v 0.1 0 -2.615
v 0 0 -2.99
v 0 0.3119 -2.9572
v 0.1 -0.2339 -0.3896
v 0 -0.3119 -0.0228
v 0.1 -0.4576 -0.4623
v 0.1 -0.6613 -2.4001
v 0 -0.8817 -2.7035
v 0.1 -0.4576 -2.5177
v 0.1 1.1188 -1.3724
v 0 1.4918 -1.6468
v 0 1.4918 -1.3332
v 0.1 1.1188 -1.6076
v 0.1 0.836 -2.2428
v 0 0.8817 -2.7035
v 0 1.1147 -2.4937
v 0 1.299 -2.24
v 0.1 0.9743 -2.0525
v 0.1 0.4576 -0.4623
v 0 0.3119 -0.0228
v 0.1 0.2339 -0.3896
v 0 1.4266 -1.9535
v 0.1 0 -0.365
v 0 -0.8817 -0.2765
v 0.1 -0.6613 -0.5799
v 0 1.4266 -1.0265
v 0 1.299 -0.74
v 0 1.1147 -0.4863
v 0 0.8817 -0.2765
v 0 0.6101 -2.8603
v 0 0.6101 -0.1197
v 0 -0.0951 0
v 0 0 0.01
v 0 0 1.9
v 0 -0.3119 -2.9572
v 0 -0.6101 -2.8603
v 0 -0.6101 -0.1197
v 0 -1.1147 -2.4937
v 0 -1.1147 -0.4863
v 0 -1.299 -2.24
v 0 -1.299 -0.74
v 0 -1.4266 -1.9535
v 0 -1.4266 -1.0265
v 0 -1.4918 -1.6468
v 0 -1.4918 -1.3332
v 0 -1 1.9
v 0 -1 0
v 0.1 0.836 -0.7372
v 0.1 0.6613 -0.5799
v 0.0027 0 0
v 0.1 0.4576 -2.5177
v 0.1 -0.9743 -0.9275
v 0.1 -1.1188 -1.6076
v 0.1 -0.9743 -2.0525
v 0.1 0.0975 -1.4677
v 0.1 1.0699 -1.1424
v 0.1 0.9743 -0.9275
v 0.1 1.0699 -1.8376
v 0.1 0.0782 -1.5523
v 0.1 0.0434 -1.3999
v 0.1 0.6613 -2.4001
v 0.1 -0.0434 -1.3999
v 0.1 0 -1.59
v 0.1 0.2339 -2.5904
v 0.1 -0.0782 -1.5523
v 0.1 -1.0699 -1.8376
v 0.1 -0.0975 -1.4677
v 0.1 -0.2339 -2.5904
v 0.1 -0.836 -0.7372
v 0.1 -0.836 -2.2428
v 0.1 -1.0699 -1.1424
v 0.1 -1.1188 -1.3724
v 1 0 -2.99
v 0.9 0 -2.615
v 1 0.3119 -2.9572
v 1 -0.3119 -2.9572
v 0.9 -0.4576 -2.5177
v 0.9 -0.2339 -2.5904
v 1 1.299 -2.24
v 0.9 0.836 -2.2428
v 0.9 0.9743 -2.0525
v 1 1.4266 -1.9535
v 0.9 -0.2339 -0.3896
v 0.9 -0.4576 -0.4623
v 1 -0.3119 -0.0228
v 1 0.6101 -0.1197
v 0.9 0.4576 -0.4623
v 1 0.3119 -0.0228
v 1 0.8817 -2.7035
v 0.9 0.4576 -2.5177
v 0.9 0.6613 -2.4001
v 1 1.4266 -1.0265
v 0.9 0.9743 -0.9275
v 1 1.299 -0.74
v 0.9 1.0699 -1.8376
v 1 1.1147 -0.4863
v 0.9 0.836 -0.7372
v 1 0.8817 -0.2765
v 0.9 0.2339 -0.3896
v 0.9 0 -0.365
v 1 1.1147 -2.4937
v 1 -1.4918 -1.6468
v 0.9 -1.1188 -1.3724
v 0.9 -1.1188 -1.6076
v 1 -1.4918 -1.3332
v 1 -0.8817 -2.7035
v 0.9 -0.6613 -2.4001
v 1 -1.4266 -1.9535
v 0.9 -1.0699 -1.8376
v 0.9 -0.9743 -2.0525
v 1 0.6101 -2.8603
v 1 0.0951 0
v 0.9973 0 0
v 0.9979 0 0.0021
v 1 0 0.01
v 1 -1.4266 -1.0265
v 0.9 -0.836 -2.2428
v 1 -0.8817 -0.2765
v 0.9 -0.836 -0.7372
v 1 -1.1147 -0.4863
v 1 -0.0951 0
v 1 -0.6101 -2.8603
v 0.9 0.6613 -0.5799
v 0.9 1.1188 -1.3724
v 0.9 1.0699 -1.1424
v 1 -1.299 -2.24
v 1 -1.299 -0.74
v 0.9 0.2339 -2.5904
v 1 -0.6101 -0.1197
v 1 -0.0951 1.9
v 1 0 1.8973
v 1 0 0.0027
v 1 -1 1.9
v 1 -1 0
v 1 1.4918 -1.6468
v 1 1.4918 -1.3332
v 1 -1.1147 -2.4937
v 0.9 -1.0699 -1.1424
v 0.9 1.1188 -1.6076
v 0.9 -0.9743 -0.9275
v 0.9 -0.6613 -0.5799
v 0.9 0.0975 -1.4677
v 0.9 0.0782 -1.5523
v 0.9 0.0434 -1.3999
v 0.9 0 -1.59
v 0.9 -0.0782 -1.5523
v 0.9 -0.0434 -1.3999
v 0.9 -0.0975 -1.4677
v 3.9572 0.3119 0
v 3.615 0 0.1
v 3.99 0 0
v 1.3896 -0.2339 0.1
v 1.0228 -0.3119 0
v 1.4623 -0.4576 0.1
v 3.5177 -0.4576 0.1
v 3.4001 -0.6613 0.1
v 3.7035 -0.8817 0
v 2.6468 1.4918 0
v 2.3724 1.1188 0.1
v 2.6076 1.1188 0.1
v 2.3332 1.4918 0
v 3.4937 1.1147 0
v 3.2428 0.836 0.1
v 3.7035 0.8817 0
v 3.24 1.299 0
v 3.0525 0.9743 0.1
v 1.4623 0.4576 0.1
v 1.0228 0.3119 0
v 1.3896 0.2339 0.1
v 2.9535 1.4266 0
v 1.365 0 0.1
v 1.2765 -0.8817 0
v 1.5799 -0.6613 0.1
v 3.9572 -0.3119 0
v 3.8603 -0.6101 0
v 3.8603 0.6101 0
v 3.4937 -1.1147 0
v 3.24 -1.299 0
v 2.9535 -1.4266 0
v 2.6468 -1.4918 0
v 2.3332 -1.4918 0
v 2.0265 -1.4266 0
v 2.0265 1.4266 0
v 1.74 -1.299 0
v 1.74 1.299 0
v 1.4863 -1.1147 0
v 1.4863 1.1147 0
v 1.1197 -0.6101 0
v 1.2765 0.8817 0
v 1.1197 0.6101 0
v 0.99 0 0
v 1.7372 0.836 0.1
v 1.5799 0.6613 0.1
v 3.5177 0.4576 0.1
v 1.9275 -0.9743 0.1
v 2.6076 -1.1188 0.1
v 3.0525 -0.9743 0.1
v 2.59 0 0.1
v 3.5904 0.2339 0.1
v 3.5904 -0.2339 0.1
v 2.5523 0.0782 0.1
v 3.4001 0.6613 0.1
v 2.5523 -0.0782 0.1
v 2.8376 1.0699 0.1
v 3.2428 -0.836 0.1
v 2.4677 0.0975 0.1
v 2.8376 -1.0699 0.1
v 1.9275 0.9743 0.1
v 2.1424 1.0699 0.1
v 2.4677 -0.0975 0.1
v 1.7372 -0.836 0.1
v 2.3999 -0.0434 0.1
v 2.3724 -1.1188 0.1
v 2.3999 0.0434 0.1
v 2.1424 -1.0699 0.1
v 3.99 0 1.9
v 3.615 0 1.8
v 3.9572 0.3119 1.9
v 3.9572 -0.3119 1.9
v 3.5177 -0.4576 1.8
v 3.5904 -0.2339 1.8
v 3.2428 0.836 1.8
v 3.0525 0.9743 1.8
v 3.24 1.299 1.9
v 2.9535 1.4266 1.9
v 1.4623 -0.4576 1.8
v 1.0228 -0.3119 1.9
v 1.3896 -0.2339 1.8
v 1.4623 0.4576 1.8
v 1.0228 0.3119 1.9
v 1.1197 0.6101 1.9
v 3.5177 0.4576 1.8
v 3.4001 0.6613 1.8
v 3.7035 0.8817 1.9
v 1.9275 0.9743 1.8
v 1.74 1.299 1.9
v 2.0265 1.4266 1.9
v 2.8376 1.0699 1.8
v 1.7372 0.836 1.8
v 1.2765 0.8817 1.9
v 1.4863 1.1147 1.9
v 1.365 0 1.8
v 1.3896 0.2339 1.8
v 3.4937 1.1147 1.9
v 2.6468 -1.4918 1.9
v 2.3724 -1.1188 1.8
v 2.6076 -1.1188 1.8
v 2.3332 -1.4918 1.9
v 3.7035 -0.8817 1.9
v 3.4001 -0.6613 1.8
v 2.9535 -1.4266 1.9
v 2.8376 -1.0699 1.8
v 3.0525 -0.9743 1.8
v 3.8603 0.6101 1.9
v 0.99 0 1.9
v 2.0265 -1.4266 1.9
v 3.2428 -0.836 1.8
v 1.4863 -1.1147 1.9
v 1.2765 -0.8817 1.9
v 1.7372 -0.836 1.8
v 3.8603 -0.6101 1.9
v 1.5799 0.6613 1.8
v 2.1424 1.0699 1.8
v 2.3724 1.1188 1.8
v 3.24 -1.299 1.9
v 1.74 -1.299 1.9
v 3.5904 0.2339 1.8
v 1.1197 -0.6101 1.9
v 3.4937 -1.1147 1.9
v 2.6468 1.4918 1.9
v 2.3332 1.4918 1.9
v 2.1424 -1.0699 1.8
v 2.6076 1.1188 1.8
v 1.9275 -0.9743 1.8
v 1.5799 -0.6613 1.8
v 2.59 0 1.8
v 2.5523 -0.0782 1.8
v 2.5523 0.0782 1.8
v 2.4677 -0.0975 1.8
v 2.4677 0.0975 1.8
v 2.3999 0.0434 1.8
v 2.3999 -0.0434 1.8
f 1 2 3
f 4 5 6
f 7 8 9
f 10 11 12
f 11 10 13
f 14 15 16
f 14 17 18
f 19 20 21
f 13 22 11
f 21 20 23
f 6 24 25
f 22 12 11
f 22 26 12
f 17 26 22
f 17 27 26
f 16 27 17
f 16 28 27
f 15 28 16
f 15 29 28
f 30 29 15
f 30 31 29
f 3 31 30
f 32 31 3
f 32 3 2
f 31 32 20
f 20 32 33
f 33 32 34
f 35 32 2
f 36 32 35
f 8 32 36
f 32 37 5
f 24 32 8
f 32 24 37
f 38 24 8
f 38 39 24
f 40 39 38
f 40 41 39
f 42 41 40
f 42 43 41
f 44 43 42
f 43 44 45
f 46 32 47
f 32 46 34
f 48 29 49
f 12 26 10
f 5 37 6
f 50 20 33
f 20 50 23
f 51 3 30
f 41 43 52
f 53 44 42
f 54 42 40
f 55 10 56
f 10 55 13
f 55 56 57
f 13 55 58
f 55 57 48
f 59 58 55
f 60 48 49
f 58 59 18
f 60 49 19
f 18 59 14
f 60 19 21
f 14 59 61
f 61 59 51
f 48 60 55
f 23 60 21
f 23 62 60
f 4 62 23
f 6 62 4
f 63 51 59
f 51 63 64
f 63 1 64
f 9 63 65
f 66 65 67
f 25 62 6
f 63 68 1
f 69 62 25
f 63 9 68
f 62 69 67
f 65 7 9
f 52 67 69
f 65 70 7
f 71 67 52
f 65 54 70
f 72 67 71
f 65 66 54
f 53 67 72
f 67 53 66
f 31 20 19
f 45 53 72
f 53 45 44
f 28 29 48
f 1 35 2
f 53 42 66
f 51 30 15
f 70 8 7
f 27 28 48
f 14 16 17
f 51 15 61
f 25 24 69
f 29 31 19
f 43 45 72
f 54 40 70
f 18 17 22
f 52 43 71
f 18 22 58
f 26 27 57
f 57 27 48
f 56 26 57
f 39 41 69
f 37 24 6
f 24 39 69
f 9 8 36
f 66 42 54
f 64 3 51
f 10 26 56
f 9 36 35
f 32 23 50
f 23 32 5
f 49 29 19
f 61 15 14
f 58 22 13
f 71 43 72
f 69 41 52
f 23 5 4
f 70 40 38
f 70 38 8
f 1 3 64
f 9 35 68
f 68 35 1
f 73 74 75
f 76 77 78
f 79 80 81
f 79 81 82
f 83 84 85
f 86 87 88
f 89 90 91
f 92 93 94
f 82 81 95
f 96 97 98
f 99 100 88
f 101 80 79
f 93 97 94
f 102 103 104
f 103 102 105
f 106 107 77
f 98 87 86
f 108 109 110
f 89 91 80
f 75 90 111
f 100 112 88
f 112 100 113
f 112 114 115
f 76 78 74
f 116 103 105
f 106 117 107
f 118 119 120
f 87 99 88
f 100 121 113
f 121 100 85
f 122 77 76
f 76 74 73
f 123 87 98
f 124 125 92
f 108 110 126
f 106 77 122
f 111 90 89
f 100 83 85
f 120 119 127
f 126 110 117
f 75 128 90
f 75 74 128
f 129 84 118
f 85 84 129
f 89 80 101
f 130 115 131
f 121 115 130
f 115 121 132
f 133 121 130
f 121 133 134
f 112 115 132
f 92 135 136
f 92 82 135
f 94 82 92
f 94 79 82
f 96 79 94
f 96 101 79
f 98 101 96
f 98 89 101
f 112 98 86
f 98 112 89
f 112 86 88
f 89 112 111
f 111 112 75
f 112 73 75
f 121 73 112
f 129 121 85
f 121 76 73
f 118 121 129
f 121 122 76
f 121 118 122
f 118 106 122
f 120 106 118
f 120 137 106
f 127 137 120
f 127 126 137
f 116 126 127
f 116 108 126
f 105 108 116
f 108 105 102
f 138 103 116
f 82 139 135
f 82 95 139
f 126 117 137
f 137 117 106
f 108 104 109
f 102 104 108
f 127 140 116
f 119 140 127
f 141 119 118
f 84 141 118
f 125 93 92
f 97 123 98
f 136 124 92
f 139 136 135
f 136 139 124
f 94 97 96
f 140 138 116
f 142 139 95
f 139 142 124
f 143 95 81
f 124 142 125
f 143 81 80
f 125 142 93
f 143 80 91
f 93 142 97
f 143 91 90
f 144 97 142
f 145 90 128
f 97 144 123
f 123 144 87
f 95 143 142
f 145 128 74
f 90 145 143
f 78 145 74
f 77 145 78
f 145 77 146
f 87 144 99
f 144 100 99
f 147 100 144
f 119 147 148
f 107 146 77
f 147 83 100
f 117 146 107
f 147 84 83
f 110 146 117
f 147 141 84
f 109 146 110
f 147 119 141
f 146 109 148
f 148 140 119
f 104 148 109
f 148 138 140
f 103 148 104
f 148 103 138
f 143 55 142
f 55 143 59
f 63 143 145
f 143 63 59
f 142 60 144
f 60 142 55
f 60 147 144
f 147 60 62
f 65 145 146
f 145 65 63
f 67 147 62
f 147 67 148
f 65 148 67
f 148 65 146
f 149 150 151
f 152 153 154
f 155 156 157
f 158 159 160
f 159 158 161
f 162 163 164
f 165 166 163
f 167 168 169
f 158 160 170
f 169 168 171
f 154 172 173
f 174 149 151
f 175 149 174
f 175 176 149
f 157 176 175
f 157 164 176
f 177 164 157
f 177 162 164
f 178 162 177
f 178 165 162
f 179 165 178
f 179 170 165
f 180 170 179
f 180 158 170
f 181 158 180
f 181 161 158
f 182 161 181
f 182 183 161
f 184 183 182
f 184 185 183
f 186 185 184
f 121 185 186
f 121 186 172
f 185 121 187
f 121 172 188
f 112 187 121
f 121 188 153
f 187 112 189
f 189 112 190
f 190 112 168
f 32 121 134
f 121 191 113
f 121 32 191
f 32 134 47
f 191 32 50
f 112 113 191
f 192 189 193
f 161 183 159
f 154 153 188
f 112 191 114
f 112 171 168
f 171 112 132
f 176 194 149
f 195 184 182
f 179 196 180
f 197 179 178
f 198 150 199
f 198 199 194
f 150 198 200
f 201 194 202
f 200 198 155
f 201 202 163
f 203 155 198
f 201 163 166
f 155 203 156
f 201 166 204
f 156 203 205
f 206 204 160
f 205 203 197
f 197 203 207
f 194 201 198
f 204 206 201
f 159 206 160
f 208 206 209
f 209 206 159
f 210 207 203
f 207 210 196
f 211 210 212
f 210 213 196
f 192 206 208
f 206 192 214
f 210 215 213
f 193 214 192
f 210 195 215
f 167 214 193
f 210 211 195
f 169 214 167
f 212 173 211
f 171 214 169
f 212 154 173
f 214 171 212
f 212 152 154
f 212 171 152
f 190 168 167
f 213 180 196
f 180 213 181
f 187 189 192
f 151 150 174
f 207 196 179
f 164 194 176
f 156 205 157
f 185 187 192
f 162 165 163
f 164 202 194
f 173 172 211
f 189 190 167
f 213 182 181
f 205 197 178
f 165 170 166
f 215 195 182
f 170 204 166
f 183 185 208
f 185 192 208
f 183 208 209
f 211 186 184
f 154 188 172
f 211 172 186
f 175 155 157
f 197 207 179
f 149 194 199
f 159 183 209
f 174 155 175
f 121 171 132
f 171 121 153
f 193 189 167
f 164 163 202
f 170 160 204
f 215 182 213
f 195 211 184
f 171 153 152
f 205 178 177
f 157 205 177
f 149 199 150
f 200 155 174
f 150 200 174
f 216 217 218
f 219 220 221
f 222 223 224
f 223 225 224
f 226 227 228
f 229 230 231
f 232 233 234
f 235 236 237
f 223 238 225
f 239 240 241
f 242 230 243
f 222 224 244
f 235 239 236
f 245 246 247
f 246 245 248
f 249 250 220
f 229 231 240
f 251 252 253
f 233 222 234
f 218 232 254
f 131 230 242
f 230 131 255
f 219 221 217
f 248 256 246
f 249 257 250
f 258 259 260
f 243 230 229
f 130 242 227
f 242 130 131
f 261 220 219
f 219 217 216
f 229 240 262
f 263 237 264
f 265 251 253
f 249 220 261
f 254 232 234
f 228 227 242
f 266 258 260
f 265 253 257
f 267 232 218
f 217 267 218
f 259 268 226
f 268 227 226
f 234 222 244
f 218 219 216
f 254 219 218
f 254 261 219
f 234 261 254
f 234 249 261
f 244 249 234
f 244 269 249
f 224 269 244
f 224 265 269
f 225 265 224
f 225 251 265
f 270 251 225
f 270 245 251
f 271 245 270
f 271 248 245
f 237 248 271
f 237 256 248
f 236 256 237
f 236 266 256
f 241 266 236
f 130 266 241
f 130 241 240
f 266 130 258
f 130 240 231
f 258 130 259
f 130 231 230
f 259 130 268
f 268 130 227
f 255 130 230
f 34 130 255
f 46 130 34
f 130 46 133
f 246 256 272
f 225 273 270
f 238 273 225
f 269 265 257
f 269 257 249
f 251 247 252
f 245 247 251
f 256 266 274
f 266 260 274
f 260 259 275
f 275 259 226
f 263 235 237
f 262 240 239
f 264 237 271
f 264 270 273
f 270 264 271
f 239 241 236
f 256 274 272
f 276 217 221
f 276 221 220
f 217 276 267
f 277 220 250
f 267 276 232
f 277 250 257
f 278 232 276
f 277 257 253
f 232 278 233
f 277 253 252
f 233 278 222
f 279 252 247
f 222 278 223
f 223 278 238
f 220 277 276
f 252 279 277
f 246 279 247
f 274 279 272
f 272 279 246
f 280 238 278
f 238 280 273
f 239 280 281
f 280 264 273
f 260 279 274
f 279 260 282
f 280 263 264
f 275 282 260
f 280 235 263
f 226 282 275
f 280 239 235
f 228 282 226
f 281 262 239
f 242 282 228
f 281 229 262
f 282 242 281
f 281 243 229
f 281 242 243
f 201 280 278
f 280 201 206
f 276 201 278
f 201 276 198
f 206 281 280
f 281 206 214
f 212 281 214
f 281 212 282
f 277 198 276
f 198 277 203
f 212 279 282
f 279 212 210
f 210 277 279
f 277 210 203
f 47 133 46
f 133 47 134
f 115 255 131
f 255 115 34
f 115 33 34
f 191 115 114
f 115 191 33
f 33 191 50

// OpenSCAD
// file: ../common/math_funcs.scad
// Useful Math Functions

// Rotate vec3 `vector`, `angle` degrees around the Z axis.
function rotatez(angle, vector) =
    vector *
    [[ cos(angle), sin(angle), 0],
     [-sin(angle), cos(angle), 0],
     [          0,          0, 1]];

// Test
assert([0, 1, 3] == rotatez(90, [1, 0, 3]));

// Rotate vec3 `vector`, `angle` degrees around the X axis.
function rotatex(angle, vector) =
    vector *
    [[1,           0,          0],
     [0,  cos(angle), sin(angle)],
     [0, -sin(angle), cos(angle)]];

// Test
assert([3, 0, 1] == rotatex(90, [3, 1, 0]));

// Rotate vec3 `vector`, `angle` degrees around the Y axis.
function rotatey(angle, vector) =
    vector *
    [[cos(angle), 0, -sin(angle)],
     [0,          1,           0],
     [sin(angle), 0,  cos(angle)]];

// Test
assert([1, 3, 0] == rotatey(90, [0, 3, 1]));

// Rotate vec3 `vector`, `axes.x` degrees around the X axis, `axes.y`
// degrees around the Y axis, and `axes.z` degrees around the Z
// axis. This is the function equivalent of the module `rotate`.
function rotate(axes, vec) =
    assert(len(axes) == 3, "rotate expects vec3 axes")
    assert(len(vec) == 3, "rotate expects vec3 vec")
    rotatez(axes.z,
            rotatey(axes.y,
                    rotatex(axes.x, vec)));

// Test
// start: [1, 2, 3]
//   90x: [1, -3, 2]
//   90y: [2, -3, -1]
//   90z: [3,  2, -1]
assert([3, 2, -1] == rotate([90, 90, 90], [1, 2, 3]));

// Visual Test: You should see a blue cube and a red sphere
// overlapping each other.
color("red") rotate([105,25,45]) translate([1, 2, 3]) {
    sphere(0.25);
}
color("blue") translate(rotate([105,25,45], [1, 2, 3])) {
    cube(0.35, center=true);
}

// Scale vec3 `vector` by the given amount of each component of axes.
function scale(axes, vec) =
    vec * [[axes.x, 0, 0], [0, axes.y, 0], [0, 0, axes.z]];

// Absolute value of each element in the vector.
function vabs(vec) =
    [ for (e = vec) abs(e) ];
// file: ../common/common.scad
include <math_funcs.scad>

// minimum distance to move an edge to avoid face interference when
// slicing
$err = 0.01;

// Use this function to help encapuslate the shifts that are required
// to avoid rendering conflicts. For example, the two rectangular
// solids in this difference have faces at exactly the same space:
//
// ```
// difference() {
//    cube([3,2,1]);
//    translate([1, 0, 0]) cube([1,1,1]);
// }
// ```
//
// To resolve the conflicts on the front, top, and bottom faces, add
// "a little" in Y, and "a little more" in Z, then shift back and
// down, to put the smaller cube's faces outside of the larger solid's
// (while keeping the "cutting" faces in the same place):
//
// ```
// difference() {
//    cube([3,2,1]);
//    translate([1, 0, 0] - err([0, 1, 1])) cube([1,1,1] + err([0, 1, 2]));
// }
// ```
//
// Override the special variable `$err` if the default 0.01 shift is
// not enough for your use case.
function err(vec) = $err * vec;

// This is "cube" with a tool to help avoid rendering conflicts.  Use
// errs to make pieces for slicing out of other pieces. The elements
// of the vector apply to [x, y, z]. Each value should be 0, 1, -1, or
// 2.
//   0: make the dimension exactly as specified
//   1: add `err` to the dimension
//  -1: add `err` to the dimension, but also shift the object -err
//      (i.e. add err to the zero end of that dimension)
//   2: add `2*err` to the dimension, but also shift the object -err
//      (i.e. add err to each end)
// Using errs prevents the need for +/-err to appear in object
// creation code.
module square_stock(size, errs=[0,0,0]) {
    // If adding err to both ends or toward the negative axis, shift
    // err in the negative axis direction. This makes the cube run
    // from -err to size.d+err for 2 or to size.d for -1.
    translate([ for (d = errs) (d == 2 || d == -1 ? -$err : 0) ])
        cube(size + err(vabs(errs)));
}

// This is "cylinder" with two features:
//   1. length=x (not height=z, as with cylinder)
//   2. errs vec for less noisy slicing
//
// See `square_stock` for description of errs. errs[0] applies to
// length.  errs[1] applies to radius, but does not shift position for
// -1 or 2.
module round_stock(length, radius, errs=[0,0]) {
    translate([errs.x == 2 || errs.x == -1 ? -$err : 0, 0, 0])
    rotate([0, 90, 0])
    cylinder(length + ($err * abs(errs.x)),
             r = (radius + ($err * abs(errs[1]))));
}
// file: params.scad
// The full width of the unit, outer edge of one end to outer edge of
// the other.
length = 84;

// The height of the end piece.
end_height = 60;

// The depth of the end piece.
end_depth = 30;

// The height of the front of each shelf, and the angle it rises from
// there. List of [height, angle] pairs. Note that the height is of
// the top of the support - the tops of the slats are half their
// thickness above that.
shelf_heights_and_angles = [[0,15],[15,15],[30,15],[45,0]];

// How wide the pieces used to make the end of the unit are.
end_stock_width = 5;

// How thick the pieces used to make the end of the unit are.
end_stock_thickness = 1.9;

// How wide the slats of the shelves are.
slat_stock_width = 1.9;

// How thick the slats of the shelves are.
slat_stock_thickness = 1;

// The minimum space to allow between shelf slats.
min_slat_spacing = 1.9;

// The maximum number of slats to use per shelf.
max_slats = 6;

// Shelves at or above this angle should have their front slat raised
// to full height, instead of recessed into the shelf support, to
// provide a lip to keep shoes from sliding off.
raised_front_slat_min_angle = 5;

// If all shelves are at very similar angles, and/or it's not
// necessary for every shelf to span the full depth of the unit,
// setting this value to `true` will choose one shelf support depth
// and cut angle for all shelves, regardless of their mounting angle.
reduce_unique_parts = false;

// Color of the top and bottom components (the horizontal components)
// of the end assembly.
end_top_bottom_color = "#ccccff";

// Color of the frontand back components (the vertical components) of
// the end assembly.
end_front_back_color = "#ccffcc";

// Color of the shelf slats.
slat_color = "#cccc99";

// Color of the supports connecting the slats to the ends.
shelf_support_color = "#99cccc";
// file: ../common/echo-camera-arg.scad
// This file supports the build process by converting a files $vp*
// settings to a --camera argument to be used at the commandline (see
// CAMERA_OPT in Makefile.common).

// Two ways to used this file:
//
//    include <../common/echo-camera-arg.scad>
//
// OR
//
//    use <../common/echo-camera-arg.scad>
//    echo(camera_arg());

// $vpt/r/d in a formatted --camera argument, for the build to use to
// avoid warnings about them overriding --autocenter and
// --viewall. Use this as:
//
//     echo(camera_arg());
//
// The echo can't be in here, because OpenSCAD expects to find a
// module, not a function, if the return value is ignored. That means
// it prints a warning about being unable to find a *module* named
// camerArg.
function camera_arg() =
    str("--camera=",
        $vpt[0],",",$vpt[1],",",$vpt[2],",",
        $vpr[0],",",$vpr[1],",",$vpr[2],",",
        $vpd);

// Doing the echo here means adding this to a file is a one-liner via
// include.
echo(camera_arg());
// main file
// Just showing the size of a slat.
//cmdline: --projection=o --imgsize=800,800
include <../common/echo-camera-arg.scad>

include <params.scad>
use <shoe-rack.scad>
use <../common/labeling.scad>

$vpr=[ 90.00, 0.00, 0.00 ];
$vpt=[ 3, 0.00, -0.91 ];
$vpf=22.50;
$vpd=17.66;

rotate([0, 0, -90]) slat_stock(1);
size_label(slat_stock_thickness);
translate([slat_stock_thickness, 0]) {
    size_label(slat_stock_width, rotation=-90);
}
